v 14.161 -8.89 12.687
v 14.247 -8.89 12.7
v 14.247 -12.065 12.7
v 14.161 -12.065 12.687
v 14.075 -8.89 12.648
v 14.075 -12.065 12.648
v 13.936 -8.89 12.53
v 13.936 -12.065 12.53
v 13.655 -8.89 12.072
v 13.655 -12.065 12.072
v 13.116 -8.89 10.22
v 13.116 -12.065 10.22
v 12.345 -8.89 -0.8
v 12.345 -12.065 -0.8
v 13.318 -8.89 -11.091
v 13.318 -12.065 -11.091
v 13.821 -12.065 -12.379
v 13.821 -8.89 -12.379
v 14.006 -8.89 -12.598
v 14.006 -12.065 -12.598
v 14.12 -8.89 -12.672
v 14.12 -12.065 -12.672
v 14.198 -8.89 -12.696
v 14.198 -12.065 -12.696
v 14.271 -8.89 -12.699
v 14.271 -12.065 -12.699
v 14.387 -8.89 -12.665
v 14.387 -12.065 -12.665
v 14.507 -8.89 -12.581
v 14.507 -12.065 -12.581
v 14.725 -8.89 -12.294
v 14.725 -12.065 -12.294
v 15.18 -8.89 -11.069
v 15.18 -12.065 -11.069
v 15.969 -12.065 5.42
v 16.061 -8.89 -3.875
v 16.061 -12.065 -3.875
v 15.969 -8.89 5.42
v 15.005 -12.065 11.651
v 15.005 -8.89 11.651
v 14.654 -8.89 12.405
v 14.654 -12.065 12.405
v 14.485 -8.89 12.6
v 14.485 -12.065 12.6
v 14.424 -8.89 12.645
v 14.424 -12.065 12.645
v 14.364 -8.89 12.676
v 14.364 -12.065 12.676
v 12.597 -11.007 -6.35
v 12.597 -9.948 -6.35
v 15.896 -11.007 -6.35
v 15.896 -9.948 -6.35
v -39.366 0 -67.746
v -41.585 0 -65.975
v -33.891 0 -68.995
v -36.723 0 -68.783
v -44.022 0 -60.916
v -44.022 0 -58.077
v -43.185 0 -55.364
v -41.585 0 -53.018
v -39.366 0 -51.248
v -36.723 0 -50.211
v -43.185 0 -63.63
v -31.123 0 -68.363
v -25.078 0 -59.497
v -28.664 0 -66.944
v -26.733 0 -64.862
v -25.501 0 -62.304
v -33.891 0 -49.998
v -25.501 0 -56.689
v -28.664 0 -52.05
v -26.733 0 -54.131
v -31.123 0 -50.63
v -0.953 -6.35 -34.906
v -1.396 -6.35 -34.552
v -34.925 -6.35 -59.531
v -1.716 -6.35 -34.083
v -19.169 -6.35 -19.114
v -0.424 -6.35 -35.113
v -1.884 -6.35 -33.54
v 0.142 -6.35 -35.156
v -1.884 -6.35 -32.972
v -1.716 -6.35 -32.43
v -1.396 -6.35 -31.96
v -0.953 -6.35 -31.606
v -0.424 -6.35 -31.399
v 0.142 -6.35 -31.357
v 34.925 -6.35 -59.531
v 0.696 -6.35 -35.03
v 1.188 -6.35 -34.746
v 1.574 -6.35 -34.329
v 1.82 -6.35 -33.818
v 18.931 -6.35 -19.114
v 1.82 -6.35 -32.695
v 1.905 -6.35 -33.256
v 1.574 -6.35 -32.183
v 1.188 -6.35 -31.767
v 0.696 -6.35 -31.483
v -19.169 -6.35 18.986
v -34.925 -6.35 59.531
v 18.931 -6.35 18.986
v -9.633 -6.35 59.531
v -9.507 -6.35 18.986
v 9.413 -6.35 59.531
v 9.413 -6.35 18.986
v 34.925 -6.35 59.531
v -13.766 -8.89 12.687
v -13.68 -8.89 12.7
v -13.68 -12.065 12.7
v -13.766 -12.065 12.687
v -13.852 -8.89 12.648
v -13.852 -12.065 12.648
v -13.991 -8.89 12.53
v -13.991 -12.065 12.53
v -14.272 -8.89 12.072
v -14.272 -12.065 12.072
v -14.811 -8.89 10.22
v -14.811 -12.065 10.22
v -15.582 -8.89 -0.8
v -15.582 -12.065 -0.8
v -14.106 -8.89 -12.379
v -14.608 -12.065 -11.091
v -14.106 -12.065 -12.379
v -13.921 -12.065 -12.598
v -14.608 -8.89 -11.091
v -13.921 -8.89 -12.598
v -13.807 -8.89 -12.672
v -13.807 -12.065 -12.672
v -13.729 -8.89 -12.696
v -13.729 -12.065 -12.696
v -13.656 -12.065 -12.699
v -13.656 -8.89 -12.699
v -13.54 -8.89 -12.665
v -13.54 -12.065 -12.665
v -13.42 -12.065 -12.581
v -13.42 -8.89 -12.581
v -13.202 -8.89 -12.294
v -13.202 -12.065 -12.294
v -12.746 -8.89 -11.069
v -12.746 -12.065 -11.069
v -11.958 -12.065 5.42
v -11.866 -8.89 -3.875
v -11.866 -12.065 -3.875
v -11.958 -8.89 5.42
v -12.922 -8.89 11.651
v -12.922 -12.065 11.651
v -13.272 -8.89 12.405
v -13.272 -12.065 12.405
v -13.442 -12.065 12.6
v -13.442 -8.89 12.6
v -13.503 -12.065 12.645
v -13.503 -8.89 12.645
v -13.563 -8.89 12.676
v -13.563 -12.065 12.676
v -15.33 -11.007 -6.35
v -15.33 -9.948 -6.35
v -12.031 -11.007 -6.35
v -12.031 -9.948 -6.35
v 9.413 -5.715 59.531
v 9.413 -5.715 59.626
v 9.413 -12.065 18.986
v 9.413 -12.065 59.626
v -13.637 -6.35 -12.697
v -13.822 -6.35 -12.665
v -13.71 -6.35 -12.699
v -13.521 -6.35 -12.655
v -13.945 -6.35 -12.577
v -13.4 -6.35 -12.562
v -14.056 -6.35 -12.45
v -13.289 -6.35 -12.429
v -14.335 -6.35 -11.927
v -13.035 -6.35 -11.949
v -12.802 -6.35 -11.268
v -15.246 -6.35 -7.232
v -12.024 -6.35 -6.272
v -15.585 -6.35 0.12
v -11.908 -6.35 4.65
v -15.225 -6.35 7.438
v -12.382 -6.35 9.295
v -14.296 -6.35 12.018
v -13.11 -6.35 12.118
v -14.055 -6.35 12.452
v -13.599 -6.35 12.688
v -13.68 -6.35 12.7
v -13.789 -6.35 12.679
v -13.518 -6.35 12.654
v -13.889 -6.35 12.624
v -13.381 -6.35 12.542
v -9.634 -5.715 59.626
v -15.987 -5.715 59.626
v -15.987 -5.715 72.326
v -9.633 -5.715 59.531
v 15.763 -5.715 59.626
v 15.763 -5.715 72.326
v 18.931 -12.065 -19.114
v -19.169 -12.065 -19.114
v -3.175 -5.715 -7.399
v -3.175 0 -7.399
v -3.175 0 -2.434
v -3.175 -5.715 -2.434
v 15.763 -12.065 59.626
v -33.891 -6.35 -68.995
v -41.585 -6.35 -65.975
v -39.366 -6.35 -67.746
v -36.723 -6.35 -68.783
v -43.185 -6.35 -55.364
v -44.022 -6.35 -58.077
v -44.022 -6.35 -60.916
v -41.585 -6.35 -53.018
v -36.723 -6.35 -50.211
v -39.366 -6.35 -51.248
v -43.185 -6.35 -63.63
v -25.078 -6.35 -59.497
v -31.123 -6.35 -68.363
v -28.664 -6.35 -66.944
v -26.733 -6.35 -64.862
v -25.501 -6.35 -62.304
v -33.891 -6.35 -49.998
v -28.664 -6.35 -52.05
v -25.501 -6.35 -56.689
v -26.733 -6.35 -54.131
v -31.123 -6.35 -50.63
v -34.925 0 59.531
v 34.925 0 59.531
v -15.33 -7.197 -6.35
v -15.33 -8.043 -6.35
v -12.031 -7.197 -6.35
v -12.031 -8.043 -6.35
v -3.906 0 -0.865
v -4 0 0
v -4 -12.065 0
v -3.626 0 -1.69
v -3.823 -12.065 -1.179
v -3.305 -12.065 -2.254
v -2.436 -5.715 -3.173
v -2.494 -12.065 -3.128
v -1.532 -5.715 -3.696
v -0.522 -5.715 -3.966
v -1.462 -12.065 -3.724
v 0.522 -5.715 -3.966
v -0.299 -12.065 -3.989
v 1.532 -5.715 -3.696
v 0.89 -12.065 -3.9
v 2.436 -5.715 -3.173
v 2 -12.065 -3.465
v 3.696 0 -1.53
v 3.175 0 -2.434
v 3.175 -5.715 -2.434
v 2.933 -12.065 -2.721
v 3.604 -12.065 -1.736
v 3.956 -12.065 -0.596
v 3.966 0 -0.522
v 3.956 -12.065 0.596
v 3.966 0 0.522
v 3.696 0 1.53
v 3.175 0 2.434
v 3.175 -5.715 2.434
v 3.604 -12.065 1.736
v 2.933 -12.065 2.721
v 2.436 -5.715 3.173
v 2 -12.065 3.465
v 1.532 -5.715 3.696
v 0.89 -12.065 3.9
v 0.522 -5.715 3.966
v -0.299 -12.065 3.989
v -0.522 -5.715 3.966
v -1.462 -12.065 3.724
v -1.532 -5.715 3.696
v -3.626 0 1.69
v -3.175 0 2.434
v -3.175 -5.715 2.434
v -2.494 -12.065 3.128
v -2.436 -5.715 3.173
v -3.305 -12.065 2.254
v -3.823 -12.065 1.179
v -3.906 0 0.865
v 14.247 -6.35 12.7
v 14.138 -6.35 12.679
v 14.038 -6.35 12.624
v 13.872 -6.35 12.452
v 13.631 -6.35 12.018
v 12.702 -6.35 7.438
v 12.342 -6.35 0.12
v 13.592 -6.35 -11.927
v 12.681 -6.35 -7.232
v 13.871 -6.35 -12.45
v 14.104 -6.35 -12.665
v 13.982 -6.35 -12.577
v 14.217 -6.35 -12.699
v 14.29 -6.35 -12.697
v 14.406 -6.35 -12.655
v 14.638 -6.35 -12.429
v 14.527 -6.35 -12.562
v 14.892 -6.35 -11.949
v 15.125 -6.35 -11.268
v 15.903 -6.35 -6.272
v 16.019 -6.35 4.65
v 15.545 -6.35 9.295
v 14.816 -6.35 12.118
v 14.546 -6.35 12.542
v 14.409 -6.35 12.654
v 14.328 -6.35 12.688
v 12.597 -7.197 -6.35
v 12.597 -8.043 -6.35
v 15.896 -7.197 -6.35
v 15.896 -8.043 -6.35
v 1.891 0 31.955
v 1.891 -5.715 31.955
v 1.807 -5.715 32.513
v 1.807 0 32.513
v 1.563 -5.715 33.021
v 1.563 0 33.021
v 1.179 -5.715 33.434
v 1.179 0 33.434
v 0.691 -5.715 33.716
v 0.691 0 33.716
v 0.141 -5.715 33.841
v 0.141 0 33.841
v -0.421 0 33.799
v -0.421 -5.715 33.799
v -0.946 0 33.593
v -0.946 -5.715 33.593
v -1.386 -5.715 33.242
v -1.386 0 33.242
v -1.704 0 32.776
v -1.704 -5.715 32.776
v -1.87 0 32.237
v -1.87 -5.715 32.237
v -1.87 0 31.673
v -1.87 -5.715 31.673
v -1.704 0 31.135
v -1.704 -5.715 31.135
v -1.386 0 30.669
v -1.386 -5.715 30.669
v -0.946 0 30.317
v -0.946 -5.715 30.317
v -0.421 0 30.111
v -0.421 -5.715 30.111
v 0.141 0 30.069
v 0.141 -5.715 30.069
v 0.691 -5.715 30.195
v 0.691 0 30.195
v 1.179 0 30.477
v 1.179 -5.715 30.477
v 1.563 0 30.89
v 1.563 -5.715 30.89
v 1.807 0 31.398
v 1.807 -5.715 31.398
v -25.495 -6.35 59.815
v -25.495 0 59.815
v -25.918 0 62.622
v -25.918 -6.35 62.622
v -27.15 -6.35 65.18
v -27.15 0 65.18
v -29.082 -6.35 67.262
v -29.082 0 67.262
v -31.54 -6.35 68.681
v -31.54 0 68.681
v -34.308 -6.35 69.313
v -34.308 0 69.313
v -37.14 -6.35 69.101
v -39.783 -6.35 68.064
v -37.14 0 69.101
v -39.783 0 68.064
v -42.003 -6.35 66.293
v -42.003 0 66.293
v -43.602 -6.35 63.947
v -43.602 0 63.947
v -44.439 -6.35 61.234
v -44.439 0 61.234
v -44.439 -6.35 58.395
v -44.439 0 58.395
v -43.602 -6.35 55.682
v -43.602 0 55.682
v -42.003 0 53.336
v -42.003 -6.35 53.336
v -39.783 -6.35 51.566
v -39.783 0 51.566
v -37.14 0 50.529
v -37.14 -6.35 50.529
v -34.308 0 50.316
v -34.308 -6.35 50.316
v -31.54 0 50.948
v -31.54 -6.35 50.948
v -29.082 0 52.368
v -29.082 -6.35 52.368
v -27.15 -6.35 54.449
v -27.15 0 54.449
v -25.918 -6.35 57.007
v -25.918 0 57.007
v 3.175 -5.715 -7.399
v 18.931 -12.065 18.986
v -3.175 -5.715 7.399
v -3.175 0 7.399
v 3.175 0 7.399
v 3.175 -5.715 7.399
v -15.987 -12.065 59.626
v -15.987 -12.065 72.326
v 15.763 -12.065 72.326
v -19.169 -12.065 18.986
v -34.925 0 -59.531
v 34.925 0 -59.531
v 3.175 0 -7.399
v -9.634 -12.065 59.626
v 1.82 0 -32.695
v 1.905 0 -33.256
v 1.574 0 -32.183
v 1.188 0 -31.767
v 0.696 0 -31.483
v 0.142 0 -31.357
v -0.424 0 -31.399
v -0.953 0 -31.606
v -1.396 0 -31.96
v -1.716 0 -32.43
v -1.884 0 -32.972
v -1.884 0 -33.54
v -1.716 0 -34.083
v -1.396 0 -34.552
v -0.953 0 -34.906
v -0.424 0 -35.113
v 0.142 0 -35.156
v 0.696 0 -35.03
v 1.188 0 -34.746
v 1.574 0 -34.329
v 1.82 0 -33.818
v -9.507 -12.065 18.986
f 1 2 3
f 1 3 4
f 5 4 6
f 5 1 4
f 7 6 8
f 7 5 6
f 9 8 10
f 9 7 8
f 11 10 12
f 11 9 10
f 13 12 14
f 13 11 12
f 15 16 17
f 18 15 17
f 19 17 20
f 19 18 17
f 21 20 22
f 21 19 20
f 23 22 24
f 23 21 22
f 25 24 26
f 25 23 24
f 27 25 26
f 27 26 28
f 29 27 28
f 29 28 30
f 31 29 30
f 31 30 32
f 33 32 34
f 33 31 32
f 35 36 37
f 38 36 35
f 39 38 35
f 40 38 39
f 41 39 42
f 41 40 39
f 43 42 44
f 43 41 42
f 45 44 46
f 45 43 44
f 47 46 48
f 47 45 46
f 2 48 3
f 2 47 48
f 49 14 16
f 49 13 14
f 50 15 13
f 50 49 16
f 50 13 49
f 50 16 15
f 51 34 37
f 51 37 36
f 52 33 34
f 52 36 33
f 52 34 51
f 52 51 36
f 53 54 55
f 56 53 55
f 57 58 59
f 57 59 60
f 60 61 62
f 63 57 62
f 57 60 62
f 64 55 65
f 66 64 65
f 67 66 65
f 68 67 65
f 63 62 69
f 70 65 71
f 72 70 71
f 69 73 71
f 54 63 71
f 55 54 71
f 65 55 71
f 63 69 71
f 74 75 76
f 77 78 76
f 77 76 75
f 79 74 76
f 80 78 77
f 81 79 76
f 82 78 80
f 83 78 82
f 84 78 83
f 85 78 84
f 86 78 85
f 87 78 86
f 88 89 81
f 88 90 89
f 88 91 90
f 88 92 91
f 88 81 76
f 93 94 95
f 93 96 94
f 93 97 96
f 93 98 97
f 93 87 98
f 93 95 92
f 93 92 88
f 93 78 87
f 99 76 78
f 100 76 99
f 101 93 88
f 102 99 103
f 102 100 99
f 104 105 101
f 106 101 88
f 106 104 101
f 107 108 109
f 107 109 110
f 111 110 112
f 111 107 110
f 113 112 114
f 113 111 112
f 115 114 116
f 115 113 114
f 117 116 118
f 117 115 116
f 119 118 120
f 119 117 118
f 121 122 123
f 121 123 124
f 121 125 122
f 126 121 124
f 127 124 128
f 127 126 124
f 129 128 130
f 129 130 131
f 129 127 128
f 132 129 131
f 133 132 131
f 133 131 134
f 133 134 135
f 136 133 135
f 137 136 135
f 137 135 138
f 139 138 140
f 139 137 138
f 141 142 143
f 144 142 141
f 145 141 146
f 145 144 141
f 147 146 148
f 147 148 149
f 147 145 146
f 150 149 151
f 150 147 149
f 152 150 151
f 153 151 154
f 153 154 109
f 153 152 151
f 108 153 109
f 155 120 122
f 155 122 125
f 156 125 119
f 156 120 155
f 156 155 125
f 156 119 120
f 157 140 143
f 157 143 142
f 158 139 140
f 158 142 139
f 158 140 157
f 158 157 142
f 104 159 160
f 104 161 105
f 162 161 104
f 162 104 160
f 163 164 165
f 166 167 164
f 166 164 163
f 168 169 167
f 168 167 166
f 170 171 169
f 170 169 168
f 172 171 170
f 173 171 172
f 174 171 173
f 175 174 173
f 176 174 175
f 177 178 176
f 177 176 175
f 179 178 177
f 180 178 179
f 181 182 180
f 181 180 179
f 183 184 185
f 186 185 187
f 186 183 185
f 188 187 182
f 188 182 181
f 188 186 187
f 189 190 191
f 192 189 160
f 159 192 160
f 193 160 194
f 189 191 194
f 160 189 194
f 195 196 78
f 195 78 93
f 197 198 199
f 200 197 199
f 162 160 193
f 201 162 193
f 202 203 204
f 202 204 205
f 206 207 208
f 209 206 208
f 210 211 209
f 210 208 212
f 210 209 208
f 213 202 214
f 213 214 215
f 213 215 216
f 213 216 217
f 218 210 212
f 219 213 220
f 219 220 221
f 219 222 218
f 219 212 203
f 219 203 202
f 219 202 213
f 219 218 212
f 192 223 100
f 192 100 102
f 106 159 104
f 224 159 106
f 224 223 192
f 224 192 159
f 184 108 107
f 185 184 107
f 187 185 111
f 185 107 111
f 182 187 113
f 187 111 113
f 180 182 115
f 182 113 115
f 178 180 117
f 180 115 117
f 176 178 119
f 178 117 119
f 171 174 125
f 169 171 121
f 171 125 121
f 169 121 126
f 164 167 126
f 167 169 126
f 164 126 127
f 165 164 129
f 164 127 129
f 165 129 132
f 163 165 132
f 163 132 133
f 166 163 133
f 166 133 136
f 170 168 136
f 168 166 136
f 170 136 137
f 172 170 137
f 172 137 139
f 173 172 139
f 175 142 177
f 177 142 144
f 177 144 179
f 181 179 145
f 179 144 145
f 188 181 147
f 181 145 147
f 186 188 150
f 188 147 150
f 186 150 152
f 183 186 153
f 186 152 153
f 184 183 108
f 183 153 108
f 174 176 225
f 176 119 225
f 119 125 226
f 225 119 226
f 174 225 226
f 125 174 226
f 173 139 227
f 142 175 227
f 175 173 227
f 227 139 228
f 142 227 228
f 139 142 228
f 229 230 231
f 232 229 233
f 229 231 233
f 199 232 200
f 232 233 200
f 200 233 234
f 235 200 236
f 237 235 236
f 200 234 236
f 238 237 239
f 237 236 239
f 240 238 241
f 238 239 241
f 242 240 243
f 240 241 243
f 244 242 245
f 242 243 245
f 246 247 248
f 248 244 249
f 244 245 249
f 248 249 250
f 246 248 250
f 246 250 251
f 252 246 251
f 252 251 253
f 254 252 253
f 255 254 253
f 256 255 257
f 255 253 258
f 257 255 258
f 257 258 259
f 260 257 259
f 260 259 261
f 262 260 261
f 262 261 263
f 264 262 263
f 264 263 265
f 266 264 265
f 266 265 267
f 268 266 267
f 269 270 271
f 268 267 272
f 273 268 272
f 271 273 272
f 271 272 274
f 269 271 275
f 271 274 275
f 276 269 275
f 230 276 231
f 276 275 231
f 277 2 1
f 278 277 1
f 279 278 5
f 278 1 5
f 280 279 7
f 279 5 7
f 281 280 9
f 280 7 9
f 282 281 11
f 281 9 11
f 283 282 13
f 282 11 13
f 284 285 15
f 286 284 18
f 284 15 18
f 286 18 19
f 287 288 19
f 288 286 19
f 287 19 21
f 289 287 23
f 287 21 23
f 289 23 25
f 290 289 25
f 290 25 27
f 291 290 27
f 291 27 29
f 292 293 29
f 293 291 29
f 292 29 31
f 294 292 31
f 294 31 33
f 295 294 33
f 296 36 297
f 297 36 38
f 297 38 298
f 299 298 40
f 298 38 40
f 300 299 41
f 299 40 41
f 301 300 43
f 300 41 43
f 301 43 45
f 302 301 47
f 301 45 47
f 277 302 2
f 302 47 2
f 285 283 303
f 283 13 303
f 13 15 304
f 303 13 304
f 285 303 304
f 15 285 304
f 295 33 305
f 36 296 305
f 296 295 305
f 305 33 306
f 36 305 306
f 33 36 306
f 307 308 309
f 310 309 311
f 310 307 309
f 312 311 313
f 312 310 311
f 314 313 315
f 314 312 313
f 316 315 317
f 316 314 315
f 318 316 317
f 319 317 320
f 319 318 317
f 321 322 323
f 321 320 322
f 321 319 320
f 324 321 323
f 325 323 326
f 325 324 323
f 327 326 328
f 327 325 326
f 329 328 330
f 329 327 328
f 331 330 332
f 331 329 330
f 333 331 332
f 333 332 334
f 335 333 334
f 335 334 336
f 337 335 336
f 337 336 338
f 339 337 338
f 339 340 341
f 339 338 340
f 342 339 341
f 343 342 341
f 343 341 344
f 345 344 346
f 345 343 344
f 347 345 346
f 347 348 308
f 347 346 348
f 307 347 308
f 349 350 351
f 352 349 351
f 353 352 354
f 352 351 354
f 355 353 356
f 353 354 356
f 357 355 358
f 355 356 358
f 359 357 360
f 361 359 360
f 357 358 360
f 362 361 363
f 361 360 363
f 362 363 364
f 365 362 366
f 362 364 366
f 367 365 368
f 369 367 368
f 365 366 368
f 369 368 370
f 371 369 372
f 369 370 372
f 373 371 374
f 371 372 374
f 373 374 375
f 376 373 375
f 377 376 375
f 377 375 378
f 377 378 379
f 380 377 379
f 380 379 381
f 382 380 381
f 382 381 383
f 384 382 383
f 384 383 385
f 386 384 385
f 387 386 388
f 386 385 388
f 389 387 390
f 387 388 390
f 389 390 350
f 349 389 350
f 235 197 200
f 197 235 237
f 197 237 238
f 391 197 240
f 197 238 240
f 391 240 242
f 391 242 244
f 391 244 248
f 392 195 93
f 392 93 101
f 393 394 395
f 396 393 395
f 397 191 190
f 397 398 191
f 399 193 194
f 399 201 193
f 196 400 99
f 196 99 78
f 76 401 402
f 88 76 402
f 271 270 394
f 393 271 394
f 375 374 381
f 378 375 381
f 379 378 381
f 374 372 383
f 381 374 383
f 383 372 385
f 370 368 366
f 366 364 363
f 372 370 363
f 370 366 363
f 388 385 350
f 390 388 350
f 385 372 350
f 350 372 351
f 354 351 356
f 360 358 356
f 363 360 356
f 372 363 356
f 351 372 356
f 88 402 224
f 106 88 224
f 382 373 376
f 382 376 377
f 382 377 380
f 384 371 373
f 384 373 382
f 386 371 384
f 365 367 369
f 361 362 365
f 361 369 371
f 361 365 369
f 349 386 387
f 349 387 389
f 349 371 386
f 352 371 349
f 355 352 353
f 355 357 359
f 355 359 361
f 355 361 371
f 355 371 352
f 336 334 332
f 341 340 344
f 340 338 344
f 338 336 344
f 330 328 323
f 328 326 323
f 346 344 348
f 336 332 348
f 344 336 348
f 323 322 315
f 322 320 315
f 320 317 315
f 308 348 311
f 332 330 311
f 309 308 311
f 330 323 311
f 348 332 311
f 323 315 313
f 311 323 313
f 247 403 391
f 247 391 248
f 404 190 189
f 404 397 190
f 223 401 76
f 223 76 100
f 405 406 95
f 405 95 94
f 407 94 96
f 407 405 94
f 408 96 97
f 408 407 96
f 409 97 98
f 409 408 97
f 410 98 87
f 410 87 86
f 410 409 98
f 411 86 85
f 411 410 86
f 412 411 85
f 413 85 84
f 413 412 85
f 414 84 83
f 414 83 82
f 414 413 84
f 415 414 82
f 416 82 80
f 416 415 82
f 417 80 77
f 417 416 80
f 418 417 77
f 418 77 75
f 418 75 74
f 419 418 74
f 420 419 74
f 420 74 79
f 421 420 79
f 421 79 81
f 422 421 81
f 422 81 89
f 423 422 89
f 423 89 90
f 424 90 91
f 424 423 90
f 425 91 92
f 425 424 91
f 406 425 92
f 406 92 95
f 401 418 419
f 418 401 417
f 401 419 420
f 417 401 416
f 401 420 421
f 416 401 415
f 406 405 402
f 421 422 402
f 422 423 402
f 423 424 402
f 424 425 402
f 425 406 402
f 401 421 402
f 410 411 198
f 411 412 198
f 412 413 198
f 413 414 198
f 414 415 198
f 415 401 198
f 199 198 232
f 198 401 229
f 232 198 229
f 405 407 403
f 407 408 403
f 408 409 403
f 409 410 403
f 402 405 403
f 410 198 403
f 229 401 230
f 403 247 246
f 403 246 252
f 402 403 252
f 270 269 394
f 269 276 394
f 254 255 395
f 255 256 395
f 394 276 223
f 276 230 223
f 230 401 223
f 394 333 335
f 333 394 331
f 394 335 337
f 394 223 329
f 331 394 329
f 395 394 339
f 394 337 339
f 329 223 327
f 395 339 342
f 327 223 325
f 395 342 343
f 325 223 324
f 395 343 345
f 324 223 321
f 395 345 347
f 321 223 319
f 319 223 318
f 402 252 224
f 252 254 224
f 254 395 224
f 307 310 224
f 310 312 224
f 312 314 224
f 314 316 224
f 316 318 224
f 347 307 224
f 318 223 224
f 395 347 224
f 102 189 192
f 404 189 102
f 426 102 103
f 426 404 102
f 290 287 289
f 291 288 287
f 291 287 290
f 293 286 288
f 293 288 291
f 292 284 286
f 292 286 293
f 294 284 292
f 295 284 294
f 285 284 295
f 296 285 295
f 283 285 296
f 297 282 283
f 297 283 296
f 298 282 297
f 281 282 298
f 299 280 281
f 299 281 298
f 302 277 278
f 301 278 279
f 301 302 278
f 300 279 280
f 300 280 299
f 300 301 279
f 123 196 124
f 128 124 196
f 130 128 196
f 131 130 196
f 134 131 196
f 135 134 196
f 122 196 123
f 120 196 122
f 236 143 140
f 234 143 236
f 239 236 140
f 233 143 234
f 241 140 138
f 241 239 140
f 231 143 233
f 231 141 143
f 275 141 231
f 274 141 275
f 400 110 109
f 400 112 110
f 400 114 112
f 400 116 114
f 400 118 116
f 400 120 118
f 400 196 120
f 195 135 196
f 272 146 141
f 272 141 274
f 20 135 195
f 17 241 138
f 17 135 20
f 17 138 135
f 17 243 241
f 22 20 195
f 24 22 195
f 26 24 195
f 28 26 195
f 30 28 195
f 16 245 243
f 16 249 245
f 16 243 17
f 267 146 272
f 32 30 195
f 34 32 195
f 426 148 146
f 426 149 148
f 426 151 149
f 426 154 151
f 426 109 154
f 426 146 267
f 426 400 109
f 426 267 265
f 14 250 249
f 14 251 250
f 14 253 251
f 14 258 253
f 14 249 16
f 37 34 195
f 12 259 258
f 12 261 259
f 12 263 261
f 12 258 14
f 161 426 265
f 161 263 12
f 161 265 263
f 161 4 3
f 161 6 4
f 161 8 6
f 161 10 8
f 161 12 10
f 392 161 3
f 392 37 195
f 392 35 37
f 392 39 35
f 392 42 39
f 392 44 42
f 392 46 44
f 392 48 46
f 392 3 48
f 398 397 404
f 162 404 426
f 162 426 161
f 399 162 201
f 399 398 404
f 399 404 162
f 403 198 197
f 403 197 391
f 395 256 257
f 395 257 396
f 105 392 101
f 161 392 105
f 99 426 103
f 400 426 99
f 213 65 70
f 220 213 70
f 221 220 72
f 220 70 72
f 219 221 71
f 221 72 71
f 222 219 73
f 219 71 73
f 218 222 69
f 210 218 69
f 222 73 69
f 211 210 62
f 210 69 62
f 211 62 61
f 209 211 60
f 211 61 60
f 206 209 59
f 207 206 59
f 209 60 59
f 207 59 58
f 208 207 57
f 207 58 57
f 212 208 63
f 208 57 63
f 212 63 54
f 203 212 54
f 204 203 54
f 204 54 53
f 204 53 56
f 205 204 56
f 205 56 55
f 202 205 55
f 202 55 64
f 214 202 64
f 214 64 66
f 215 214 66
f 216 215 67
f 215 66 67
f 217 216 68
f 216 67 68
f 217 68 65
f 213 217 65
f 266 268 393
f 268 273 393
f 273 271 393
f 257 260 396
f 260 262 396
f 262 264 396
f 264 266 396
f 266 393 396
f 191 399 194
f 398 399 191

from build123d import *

# Parameters (mm, degrees)
F2_R     = 9.525
F3_DEPTH = 6.35
F0_W     = 69.85
F0_H     = 119.0625
F0_R     = 1.905
F0_W_2   = 6.35
F0_H_2   = 14.798598364
F0_R_2   = 1.8912469653
F1_R     = 9.525
F6_DEPTH = 3.175
F7_D     = 8.001


with BuildPart() as f3:
    # F2 (on Front) → F3 (new body)
    with BuildSketch(Plane.XZ):
        with Locations((-34.6031077206, -59.4968087971)):
            Circle(F2_R)
    extrude(amount=F3_DEPTH)


with BuildPart() as f3b:
    # F0 (on Front) → F3, piece 2 (new body)
    with BuildSketch(Plane.XZ):
        Rectangle(F0_W, F0_H)
        with Locations((0, -33.256188035)):
            Circle(F0_R, mode=Mode.SUBTRACT)
        Rectangle(F0_W_2, F0_H_2, mode=Mode.SUBTRACT)
        with Locations((0, 31.95521608)):
            Circle(F0_R_2, mode=Mode.SUBTRACT)
    extrude(amount=F3_DEPTH)

    # F5 (on face) → F6 (join, symmetric)
    with BuildSketch(Plane.XZ.offset(8.89)):
        Polygon((-15.9865934402, 59.6262310743), (-9.6336090937, 59.6260353923), (-9.5074940844, 18.9862310743), (-19.1689059138, 18.9862310743), (-19.1689059138, -19.1137689257), (18.9310940862, -19.1137689257), (18.9310940862, 18.9862310743), (9.4134065598, 18.9862310743), (9.4134065598, 59.6262310743), (15.7634065598, 59.6262310743), (15.7634065598, 72.3262310743), (-15.9865934402, 72.3262310743), align=None)
        with BuildLine():
            add(Edge.make_bspline(
                [(-13.6804133654, 12.7), (-16.9799701538, 12.7), (-15.3301917596, -6.35), (-13.6804133654, -25.4), (-12.0306349712, -6.35), (-10.3808565769, 12.7), (-13.6804133654, 12.7)],
                knots=[0, 0, 0, 2.0943951024, 2.0943951024, 4.1887902048, 4.1887902048, 6.2831853072, 6.2831853072, 6.2831853072], degree=2, weights=[1, 0.5, 1, 0.5, 1, 0.5, 1]))
        make_face(mode=Mode.SUBTRACT)
        with BuildLine():
            add(Edge.make_bspline(
                [(14.2465028912, 12.7), (10.9469461028, 12.7), (12.596724497, -6.35), (14.2465028912, -25.4), (15.8962812854, -6.35), (17.5460596796, 12.7), (14.2465028912, 12.7)],
                knots=[0, 0, 0, 2.0943951024, 2.0943951024, 4.1887902048, 4.1887902048, 6.2831853072, 6.2831853072, 6.2831853072], degree=2, weights=[1, 0.5, 1, 0.5, 1, 0.5, 1]))
        make_face(mode=Mode.SUBTRACT)
    extrude(amount=F6_DEPTH, both=True)

    # F7 (through all)
    with Locations(Plane(origin=(0, 0, 0), x_dir=(1, 0, 0), z_dir=(0, 1, 0))):
        with Locations((0, 0)):
            Hole(F7_D / 2)


with BuildPart() as f3c:
    # F1 (on Front) → F3, piece 3 (new body)
    with BuildSketch(Plane.XZ):
        with Locations((-35.0202806294, 59.8146952689)):
            Circle(F1_R)
    extrude(amount=F3_DEPTH)


solid = Compound([f3.part, f3b.part, f3c.part])
